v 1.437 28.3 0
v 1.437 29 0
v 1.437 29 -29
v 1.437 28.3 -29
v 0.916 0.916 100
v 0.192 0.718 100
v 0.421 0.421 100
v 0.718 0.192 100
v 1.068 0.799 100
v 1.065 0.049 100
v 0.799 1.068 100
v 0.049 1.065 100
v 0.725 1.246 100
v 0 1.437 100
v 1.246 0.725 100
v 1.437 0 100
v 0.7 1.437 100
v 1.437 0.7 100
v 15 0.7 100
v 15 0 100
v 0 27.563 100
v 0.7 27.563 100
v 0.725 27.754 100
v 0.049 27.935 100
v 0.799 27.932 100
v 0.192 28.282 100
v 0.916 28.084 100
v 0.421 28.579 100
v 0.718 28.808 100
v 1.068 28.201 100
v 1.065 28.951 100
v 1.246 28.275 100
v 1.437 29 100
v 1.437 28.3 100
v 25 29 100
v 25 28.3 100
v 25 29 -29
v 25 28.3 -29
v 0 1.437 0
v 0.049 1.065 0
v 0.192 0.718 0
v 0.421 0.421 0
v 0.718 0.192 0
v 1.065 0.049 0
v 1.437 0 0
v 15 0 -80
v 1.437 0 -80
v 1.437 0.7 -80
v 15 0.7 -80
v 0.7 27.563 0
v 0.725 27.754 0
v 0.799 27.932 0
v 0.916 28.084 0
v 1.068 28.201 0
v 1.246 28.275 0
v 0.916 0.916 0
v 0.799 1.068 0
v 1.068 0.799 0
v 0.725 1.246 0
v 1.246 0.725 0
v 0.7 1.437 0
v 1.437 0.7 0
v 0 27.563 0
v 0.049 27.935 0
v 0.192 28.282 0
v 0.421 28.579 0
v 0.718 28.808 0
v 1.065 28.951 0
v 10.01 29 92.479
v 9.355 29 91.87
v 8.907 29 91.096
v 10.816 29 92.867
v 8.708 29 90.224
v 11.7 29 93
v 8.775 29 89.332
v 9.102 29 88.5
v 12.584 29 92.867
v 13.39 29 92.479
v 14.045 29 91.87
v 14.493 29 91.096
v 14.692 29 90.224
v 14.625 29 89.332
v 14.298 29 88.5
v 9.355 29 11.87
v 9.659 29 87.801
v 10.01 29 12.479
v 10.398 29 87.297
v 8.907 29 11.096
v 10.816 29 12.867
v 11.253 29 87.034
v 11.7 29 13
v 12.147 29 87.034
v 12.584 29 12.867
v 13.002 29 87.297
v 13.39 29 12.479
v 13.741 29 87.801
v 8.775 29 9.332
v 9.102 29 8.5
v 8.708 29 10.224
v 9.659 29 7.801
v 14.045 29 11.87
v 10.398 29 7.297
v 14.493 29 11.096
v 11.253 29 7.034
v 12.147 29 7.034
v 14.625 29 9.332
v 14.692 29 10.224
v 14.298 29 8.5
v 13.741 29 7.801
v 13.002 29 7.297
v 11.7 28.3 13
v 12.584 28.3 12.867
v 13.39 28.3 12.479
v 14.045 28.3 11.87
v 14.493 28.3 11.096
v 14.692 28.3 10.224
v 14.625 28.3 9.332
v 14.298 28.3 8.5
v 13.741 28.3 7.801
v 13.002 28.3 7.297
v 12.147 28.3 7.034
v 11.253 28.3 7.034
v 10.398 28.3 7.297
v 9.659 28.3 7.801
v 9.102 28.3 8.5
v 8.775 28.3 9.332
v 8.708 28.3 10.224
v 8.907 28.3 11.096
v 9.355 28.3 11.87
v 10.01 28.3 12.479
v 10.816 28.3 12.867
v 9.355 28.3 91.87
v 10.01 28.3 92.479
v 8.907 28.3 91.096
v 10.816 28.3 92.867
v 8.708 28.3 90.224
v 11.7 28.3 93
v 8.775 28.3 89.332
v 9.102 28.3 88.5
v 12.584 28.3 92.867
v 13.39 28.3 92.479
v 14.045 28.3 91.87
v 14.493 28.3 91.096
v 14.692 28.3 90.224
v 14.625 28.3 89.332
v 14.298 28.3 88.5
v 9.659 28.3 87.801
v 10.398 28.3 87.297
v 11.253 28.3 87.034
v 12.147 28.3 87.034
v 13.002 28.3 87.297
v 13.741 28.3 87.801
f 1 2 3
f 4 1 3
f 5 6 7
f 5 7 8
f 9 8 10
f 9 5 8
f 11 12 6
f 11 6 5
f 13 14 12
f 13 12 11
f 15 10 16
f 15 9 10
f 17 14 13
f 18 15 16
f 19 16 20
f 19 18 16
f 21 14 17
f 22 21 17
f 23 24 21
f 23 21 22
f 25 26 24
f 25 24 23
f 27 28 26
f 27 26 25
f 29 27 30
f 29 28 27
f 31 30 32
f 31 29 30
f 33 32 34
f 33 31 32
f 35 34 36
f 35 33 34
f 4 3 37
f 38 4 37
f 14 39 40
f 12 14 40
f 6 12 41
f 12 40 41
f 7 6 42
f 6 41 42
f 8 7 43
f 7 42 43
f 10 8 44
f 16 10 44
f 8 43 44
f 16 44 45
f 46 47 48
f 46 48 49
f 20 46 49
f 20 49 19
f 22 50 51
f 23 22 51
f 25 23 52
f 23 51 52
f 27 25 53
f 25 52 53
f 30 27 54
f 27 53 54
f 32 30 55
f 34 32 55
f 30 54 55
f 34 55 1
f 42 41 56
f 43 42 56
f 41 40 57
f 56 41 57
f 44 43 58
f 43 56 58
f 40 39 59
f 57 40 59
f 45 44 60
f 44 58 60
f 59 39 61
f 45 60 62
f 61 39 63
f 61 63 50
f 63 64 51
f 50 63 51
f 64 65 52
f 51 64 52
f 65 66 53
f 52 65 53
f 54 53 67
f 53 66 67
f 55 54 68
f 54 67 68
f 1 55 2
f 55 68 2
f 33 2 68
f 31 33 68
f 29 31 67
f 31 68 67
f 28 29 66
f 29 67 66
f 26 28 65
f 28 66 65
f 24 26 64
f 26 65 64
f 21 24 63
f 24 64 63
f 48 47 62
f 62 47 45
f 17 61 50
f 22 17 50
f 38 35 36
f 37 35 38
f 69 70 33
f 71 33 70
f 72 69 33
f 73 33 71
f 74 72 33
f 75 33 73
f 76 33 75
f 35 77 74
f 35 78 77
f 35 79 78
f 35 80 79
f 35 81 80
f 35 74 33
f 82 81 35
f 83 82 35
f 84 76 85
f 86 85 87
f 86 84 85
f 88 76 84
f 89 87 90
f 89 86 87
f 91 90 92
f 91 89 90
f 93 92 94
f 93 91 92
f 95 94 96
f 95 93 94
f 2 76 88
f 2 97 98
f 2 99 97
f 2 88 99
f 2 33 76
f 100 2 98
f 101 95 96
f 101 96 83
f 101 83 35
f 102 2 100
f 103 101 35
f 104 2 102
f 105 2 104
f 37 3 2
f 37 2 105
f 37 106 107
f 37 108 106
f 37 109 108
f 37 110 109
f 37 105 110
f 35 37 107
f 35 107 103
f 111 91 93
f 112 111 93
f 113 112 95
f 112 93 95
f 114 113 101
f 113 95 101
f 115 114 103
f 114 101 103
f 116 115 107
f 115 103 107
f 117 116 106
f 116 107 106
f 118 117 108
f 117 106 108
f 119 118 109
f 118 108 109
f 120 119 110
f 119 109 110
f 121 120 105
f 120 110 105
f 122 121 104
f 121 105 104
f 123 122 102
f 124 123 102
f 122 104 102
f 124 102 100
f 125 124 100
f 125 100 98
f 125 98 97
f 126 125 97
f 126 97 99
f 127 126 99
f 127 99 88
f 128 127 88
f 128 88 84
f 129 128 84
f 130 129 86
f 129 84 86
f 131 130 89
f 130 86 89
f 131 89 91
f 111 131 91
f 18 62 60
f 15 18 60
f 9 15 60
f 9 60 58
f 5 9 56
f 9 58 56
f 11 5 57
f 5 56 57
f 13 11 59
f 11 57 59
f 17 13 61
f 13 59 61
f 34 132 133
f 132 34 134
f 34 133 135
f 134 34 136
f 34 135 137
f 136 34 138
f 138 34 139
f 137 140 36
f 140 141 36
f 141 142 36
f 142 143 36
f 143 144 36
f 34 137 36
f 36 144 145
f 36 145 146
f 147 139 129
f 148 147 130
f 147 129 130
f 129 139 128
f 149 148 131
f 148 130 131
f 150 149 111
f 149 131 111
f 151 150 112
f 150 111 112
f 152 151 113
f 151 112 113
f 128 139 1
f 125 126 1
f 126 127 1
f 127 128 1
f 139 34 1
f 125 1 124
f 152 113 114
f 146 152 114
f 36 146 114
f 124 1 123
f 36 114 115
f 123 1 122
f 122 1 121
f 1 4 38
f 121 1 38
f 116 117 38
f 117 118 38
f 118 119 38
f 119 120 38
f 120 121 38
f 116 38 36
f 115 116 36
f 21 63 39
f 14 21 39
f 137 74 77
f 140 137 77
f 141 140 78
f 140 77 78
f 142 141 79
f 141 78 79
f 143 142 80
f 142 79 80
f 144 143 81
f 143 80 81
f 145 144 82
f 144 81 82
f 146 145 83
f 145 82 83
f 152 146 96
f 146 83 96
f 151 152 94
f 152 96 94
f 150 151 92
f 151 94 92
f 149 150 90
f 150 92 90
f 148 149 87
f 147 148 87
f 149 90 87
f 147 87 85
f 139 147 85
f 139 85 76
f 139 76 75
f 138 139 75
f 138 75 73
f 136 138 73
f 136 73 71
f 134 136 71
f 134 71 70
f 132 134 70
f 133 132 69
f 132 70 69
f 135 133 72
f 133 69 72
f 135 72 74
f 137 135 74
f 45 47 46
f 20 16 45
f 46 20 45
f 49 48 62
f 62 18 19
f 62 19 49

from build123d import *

# Parameters (mm, degrees)
SM_BASE_FLANGE_1_DEPTH = 100
SKETCH_6_W             = 23.5634
SKETCH_6_H             = 29
EXTRUDE_1_DEPTH        = 0.7
SKETCH_8_W             = 13.5634
SKETCH_8_H             = 80
EXTRUDE_3_DEPTH        = 0.7
SKETCH_9_R             = 3
CUT_EXTRUDE_1_DEPTH    = 0.7


# Sheet-metal steps are written as plain solids
with BuildPart() as part:
    # Sketch 1 → 基体-法兰1 (new body)
    with BuildSketch(Plane.XY):
        with BuildLine():
            Line((25, 29), (1.4366, 29))
            ThreePointArc((1.4366, 29), (0.420770398, 28.579229602), (0, 27.5634))
            Line((0, 27.5634), (0, 1.4366))
            ThreePointArc((0, 1.4366), (0.420770398, 0.420770398), (1.4366, 0))
            Line((1.4366, 0), (15, 0))
            Line((15, 0), (15, 0.7))
            Line((15, 0.7), (1.4366, 0.7))
            ThreePointArc((1.4366, 0.7), (0.915745145, 0.915745145), (0.7, 1.4366))
            Line((0.7, 1.4366), (0.7, 27.5634))
            ThreePointArc((0.7, 27.5634), (0.915745145, 28.084254855), (1.4366, 28.3))
            Line((1.4366, 28.3), (25, 28.3))
            Line((25, 28.3), (25, 29))
        make_face()
    extrude(amount=SM_BASE_FLANGE_1_DEPTH)

    # 草图6 → 凸台-拉伸1 (add)
    with BuildSketch(Plane(origin=(0, 29, 0), x_dir=(1, 0, 0), z_dir=(0, 1, 0))):
        with Locations((13.2183, 14.5)):
            Rectangle(SKETCH_6_W, SKETCH_6_H)
    extrude(amount=-EXTRUDE_1_DEPTH)

    # 草图8 → 凸台-拉伸3 (add)
    with BuildSketch(Plane.XZ):
        with Locations((8.2183, -40)):
            Rectangle(SKETCH_8_W, SKETCH_8_H)
    extrude(amount=-EXTRUDE_3_DEPTH)

    # 草图9 → 切除-拉伸1 (cut)
    with BuildSketch(Plane(origin=(0, 29, 0), x_dir=(1, 0, 0), z_dir=(0, 1, 0))):
        with Locations(Location((11.7, -90, 0), (0, 0, 270))):
            Circle(SKETCH_9_R)
        with Locations(Location((11.7, -10, 0), (0, 0, 270))):
            Circle(SKETCH_9_R)
    extrude(amount=-CUT_EXTRUDE_1_DEPTH, mode=Mode.SUBTRACT)


solid = part.part
